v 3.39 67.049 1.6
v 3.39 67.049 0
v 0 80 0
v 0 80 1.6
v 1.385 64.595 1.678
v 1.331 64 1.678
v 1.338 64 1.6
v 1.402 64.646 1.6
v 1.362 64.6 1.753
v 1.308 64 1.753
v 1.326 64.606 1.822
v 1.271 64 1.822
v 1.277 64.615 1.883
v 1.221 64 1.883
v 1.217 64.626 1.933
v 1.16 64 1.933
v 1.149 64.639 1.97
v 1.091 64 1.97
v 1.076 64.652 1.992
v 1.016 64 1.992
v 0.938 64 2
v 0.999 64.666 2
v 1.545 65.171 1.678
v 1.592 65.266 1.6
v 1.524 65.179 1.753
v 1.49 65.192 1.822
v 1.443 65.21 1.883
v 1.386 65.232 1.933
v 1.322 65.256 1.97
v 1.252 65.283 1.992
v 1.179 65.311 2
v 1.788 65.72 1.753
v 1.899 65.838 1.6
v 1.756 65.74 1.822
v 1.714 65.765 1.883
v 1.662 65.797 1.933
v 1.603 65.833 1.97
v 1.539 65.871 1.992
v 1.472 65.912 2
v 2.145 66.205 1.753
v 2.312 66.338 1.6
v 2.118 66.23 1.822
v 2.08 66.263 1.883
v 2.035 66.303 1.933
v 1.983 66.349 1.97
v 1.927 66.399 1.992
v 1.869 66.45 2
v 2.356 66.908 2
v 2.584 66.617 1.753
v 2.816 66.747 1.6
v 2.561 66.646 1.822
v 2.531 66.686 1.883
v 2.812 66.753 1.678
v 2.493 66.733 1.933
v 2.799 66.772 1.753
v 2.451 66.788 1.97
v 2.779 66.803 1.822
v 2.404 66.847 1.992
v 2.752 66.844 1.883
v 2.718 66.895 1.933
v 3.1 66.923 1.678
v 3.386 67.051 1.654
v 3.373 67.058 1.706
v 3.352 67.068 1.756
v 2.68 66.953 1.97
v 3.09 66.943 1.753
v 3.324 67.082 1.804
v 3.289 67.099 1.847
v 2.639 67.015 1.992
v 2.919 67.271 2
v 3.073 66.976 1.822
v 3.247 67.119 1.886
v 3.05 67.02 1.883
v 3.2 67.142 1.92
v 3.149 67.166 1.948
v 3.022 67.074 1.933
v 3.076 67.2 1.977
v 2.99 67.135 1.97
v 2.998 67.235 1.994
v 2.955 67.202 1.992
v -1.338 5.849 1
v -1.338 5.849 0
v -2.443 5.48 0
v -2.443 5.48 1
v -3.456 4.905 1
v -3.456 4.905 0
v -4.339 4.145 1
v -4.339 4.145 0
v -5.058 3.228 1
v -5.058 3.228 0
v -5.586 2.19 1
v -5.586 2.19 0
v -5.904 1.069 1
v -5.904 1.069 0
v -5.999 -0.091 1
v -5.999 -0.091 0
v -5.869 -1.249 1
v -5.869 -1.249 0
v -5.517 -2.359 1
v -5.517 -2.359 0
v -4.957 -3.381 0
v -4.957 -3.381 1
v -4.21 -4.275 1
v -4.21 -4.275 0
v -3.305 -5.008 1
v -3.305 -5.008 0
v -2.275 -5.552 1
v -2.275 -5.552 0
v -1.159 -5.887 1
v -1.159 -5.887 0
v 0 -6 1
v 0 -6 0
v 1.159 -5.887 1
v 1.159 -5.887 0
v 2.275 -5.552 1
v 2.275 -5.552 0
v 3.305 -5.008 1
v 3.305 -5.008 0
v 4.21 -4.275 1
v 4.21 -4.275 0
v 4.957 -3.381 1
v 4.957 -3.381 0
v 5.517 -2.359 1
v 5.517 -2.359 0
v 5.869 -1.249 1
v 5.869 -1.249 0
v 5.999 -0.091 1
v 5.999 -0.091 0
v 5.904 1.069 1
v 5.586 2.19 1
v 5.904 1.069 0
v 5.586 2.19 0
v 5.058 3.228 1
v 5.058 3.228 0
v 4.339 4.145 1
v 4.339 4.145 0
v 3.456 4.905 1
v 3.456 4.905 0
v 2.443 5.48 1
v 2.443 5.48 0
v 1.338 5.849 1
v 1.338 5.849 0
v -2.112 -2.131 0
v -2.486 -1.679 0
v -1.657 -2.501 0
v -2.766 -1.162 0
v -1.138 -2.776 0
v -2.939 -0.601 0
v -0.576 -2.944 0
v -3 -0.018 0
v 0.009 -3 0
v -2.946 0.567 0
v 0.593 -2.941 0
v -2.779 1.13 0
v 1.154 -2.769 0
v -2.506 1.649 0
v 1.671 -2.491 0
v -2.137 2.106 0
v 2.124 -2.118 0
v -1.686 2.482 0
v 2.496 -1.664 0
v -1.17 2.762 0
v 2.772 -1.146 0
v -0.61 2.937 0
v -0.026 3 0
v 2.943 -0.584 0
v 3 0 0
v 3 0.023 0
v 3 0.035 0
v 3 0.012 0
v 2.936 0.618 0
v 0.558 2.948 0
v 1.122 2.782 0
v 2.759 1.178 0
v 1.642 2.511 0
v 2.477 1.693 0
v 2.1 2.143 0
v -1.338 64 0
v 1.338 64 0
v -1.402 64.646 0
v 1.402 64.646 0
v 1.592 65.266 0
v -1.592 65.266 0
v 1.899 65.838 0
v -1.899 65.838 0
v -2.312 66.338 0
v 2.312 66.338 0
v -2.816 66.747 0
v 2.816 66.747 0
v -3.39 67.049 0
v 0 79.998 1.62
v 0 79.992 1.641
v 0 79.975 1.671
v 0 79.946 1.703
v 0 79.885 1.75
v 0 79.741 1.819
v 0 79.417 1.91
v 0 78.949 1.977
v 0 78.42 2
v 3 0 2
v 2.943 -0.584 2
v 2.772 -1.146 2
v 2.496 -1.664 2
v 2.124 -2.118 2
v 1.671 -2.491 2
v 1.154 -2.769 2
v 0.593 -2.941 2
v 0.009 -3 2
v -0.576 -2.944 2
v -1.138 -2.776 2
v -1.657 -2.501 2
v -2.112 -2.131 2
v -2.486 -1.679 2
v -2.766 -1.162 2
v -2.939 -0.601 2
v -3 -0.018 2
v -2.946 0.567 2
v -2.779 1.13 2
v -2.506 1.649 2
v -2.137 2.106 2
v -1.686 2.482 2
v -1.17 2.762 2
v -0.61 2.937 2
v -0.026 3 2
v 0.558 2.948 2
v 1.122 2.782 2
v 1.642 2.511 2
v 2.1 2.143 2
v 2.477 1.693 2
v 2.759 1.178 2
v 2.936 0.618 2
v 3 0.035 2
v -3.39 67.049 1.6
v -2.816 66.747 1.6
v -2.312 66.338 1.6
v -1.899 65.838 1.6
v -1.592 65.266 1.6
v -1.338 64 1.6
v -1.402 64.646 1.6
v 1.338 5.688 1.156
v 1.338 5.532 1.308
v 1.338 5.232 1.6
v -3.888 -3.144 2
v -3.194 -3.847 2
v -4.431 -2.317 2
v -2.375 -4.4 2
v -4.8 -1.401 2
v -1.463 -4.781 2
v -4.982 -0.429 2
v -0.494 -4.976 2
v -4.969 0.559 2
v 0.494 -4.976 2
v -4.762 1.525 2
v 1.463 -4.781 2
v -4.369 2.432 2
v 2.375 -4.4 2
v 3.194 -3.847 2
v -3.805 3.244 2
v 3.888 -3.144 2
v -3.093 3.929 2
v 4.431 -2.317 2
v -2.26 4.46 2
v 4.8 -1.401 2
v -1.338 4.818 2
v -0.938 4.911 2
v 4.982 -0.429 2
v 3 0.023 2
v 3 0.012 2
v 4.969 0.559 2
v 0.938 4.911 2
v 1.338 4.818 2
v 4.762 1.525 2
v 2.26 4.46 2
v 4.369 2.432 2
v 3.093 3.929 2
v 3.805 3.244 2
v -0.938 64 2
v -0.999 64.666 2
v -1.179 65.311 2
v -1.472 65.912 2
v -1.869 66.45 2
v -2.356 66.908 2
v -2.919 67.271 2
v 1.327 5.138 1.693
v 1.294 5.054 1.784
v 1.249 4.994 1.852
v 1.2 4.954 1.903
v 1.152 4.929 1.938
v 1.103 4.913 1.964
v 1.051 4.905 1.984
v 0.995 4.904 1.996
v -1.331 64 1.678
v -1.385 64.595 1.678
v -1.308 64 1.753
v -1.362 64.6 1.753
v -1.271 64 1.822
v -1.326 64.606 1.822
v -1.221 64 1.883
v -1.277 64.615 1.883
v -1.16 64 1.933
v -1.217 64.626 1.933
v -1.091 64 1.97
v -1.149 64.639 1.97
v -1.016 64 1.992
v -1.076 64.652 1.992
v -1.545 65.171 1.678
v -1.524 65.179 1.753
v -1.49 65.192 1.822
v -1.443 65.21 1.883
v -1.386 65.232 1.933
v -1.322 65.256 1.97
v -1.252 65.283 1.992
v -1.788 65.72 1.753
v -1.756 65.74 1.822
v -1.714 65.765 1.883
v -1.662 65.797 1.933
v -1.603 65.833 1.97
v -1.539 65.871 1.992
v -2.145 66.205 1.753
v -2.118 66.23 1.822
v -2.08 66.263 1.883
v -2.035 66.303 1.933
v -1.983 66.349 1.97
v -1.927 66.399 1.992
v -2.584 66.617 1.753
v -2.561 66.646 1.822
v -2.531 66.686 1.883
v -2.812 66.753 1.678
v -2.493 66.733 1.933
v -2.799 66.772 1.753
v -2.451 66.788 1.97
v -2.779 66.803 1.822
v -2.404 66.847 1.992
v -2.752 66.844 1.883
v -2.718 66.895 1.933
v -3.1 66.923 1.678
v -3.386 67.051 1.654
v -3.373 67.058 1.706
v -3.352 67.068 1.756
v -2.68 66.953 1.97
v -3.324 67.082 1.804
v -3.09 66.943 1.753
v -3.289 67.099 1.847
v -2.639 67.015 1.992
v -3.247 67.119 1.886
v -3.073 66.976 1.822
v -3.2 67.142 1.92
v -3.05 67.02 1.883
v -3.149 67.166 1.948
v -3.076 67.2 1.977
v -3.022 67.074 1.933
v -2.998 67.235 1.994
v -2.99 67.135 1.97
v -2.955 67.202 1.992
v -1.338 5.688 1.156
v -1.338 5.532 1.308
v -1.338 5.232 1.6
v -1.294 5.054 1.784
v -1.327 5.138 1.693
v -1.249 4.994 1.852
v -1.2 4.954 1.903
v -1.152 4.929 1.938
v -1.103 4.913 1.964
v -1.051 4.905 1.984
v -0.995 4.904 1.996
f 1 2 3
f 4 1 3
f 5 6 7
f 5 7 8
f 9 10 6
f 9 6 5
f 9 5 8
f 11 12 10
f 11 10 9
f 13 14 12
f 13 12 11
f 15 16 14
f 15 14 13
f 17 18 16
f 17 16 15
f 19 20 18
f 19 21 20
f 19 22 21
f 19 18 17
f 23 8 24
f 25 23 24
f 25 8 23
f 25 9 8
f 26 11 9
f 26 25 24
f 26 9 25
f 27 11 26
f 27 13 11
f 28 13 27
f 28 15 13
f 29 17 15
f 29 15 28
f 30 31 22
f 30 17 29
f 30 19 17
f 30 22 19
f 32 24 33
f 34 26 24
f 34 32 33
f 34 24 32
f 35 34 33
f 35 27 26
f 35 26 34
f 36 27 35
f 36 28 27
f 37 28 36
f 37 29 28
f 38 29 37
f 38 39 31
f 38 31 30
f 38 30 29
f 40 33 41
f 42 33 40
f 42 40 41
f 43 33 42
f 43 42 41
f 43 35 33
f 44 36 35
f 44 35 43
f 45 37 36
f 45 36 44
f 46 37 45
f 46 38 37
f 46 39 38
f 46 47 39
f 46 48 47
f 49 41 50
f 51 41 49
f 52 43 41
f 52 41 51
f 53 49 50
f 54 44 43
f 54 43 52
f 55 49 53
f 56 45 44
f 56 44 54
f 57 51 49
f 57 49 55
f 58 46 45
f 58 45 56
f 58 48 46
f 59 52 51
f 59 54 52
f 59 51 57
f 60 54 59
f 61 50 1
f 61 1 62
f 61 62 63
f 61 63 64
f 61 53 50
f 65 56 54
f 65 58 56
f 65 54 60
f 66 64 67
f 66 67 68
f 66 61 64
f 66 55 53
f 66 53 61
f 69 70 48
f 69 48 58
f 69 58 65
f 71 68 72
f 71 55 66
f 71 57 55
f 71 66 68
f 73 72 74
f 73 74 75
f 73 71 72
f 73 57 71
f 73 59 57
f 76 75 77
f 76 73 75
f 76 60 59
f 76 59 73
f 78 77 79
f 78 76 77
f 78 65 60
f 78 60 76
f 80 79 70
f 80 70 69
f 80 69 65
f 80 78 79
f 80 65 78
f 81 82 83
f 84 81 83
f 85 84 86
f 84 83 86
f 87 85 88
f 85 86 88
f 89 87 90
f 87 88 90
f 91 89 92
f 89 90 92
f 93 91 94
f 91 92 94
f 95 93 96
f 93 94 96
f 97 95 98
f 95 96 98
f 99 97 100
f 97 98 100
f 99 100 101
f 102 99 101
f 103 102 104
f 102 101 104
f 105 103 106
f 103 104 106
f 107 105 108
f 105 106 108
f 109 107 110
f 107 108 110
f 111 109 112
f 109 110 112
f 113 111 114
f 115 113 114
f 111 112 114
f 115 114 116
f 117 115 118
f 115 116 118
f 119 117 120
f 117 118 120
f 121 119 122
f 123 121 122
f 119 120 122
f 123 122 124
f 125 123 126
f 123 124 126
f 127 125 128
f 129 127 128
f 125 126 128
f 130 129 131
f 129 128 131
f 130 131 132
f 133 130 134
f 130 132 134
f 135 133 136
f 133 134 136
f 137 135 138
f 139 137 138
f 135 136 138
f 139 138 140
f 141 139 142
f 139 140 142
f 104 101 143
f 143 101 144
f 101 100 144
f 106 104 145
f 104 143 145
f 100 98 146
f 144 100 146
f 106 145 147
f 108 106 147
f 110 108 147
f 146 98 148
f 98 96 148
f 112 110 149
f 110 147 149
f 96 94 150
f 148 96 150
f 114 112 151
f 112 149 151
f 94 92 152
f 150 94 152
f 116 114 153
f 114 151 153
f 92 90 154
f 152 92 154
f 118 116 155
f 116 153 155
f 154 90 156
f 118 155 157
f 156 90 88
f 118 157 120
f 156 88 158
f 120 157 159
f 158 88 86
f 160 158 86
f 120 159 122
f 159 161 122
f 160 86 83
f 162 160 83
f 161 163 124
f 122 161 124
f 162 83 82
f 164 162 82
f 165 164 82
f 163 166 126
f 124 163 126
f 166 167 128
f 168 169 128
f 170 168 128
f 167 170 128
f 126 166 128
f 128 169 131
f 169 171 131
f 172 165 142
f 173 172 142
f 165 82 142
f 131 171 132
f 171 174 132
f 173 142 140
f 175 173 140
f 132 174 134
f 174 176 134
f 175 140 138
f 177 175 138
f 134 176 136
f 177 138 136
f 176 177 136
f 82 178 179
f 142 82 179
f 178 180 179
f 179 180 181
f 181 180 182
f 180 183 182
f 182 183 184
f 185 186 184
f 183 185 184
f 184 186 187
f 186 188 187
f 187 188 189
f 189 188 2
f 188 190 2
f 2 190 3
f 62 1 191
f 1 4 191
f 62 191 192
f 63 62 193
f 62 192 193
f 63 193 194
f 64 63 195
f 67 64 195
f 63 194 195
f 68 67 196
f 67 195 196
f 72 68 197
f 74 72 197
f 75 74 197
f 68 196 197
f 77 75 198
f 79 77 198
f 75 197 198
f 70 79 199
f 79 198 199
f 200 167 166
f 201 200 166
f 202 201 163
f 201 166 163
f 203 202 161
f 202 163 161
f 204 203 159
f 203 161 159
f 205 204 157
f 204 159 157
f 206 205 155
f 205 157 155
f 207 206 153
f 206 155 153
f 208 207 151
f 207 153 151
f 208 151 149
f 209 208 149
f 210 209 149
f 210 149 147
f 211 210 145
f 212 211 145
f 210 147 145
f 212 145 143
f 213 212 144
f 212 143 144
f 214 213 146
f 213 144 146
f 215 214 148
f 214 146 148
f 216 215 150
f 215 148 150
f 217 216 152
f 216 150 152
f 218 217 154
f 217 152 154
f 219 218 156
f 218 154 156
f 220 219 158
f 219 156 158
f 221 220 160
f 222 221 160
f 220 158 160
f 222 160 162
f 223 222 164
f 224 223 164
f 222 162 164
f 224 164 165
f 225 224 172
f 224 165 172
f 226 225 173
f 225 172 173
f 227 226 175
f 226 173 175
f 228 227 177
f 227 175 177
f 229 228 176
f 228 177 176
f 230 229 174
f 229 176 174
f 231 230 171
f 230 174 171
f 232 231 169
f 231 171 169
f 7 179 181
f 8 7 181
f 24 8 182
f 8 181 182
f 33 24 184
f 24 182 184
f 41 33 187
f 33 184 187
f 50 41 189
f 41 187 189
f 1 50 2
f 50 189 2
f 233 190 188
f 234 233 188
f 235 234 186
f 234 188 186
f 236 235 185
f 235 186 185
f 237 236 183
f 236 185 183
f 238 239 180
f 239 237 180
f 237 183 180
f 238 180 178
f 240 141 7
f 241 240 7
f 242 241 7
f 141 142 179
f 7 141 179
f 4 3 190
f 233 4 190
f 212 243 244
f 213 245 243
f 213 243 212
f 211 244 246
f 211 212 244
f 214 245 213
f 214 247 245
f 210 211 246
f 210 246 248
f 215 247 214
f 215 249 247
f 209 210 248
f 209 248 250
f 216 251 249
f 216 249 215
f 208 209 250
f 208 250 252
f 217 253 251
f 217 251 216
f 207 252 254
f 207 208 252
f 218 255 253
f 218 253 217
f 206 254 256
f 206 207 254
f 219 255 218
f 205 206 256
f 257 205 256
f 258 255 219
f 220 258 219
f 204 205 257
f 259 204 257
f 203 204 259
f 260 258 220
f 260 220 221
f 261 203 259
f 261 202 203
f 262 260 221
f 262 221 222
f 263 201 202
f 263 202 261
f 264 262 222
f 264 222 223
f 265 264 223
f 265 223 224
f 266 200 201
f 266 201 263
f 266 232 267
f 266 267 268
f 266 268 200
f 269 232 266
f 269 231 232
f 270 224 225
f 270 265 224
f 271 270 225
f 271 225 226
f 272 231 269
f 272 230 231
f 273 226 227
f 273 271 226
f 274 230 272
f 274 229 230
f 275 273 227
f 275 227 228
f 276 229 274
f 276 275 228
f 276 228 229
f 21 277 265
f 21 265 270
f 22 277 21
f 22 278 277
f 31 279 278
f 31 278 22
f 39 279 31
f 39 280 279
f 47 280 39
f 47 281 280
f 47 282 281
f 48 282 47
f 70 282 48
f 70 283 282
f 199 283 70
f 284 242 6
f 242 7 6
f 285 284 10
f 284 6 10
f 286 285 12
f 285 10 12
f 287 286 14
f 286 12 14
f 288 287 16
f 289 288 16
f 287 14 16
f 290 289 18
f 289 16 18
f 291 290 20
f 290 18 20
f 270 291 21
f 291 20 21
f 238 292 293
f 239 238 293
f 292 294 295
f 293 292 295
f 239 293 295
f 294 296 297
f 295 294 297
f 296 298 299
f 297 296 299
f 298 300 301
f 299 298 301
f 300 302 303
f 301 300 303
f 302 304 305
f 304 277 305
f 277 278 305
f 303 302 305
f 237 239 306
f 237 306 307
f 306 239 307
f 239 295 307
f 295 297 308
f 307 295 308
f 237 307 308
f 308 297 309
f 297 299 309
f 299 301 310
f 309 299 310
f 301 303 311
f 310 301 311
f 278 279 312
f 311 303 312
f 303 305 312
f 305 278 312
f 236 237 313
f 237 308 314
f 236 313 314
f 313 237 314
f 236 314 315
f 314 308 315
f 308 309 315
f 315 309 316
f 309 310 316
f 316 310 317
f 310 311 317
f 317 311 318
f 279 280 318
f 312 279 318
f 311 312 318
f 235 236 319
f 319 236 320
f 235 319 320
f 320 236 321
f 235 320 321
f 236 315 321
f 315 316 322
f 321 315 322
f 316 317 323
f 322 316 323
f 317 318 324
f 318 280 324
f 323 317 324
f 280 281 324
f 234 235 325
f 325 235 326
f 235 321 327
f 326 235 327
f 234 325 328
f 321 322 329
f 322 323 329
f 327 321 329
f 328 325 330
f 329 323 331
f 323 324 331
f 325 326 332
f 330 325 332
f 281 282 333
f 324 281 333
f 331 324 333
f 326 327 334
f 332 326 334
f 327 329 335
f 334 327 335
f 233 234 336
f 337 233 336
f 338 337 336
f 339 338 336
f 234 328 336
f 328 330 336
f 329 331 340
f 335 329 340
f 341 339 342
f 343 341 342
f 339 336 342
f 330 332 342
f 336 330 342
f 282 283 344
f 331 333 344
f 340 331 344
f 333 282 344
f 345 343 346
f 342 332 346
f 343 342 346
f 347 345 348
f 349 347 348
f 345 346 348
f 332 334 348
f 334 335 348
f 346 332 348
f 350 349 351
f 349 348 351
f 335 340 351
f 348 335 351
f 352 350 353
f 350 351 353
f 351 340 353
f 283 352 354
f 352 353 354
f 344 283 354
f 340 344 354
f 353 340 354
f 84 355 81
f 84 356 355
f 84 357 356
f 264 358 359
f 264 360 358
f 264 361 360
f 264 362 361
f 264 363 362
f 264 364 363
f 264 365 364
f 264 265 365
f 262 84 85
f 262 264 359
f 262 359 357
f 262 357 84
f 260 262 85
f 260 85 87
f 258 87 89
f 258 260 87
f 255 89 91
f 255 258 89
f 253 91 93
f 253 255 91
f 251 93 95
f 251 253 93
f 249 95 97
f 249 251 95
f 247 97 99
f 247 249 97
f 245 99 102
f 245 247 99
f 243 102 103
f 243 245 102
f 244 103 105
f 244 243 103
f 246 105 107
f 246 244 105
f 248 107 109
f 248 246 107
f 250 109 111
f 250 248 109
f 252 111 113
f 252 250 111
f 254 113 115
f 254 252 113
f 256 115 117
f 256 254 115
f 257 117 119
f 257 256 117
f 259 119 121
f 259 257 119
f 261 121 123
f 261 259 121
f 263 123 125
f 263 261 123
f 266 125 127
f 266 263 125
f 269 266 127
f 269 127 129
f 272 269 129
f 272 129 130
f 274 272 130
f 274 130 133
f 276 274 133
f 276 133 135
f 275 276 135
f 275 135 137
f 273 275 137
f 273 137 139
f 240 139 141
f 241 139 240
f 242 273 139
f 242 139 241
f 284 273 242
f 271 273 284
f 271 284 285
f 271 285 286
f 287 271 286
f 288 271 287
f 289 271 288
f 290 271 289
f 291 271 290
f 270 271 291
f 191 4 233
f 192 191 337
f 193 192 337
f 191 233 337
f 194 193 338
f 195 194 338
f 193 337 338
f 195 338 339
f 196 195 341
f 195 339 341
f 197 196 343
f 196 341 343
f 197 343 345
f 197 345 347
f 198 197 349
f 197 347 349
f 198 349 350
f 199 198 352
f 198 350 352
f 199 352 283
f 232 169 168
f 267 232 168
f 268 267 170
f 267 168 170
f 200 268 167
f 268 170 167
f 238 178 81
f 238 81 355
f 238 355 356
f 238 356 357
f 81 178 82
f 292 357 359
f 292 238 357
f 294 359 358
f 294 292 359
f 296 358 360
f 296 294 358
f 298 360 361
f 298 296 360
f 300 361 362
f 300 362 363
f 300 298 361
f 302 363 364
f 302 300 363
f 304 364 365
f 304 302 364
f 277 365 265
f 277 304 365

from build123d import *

# Parameters (mm, degrees)
F1_DEPTH = 2
F2_SIZE  = 1
F3_R     = 0.4


with BuildPart() as f1:
    # F0 (on Top) → F1 (new body)
    with BuildSketch(Plane.XY):
        with BuildLine():
            Line((-1.338212, 64), (-1.338212, 5.848862))
            ThreePointArc((-1.338212, 5.848862), (0, -6), (1.338212, 5.848862))
            Line((1.338212, 5.848862), (1.338212, 64))
            ThreePointArc((1.338212, 64), (1.898957, 65.837607), (3.390126, 67.049072))
            Line((3.390126, 67.049072), (0, 80))
            Line((0, 80), (-3.390126, 67.049072))
            ThreePointArc((-3.390126, 67.049072), (-1.898957, 65.837607), (-1.338212, 64))
        make_face()
        with BuildLine():
            ThreePointArc((2.999796, 0.034951), (2.999949, 0.017476), (3, 0))
            ThreePointArc((3, 0), (-2.999949, -0.017476), (2.999796, 0.034951))
        make_face(mode=Mode.SUBTRACT)
    extrude(amount=F1_DEPTH)

    # F2
    f2_edges = [f1.edges().sort_by_distance(p)[0] for p in [
        (0, -6, 2),
    ]]
    chamfer(f2_edges, length=F2_SIZE)

    # F3
    f3_edges = [f1.edges().sort_by_distance(p)[0] for p in [
        (1.338212, 34.924431, 2),
        (-1.338212, 34.924431, 2),
        (1.695063, 73.524536, 2),
        (-1.695063, 73.524536, 2),
        (1.898957, 65.837607, 2),
        (-1.898957, 65.837607, 2),
    ]]
    fillet(f3_edges, radius=F3_R)


solid = f1.part
